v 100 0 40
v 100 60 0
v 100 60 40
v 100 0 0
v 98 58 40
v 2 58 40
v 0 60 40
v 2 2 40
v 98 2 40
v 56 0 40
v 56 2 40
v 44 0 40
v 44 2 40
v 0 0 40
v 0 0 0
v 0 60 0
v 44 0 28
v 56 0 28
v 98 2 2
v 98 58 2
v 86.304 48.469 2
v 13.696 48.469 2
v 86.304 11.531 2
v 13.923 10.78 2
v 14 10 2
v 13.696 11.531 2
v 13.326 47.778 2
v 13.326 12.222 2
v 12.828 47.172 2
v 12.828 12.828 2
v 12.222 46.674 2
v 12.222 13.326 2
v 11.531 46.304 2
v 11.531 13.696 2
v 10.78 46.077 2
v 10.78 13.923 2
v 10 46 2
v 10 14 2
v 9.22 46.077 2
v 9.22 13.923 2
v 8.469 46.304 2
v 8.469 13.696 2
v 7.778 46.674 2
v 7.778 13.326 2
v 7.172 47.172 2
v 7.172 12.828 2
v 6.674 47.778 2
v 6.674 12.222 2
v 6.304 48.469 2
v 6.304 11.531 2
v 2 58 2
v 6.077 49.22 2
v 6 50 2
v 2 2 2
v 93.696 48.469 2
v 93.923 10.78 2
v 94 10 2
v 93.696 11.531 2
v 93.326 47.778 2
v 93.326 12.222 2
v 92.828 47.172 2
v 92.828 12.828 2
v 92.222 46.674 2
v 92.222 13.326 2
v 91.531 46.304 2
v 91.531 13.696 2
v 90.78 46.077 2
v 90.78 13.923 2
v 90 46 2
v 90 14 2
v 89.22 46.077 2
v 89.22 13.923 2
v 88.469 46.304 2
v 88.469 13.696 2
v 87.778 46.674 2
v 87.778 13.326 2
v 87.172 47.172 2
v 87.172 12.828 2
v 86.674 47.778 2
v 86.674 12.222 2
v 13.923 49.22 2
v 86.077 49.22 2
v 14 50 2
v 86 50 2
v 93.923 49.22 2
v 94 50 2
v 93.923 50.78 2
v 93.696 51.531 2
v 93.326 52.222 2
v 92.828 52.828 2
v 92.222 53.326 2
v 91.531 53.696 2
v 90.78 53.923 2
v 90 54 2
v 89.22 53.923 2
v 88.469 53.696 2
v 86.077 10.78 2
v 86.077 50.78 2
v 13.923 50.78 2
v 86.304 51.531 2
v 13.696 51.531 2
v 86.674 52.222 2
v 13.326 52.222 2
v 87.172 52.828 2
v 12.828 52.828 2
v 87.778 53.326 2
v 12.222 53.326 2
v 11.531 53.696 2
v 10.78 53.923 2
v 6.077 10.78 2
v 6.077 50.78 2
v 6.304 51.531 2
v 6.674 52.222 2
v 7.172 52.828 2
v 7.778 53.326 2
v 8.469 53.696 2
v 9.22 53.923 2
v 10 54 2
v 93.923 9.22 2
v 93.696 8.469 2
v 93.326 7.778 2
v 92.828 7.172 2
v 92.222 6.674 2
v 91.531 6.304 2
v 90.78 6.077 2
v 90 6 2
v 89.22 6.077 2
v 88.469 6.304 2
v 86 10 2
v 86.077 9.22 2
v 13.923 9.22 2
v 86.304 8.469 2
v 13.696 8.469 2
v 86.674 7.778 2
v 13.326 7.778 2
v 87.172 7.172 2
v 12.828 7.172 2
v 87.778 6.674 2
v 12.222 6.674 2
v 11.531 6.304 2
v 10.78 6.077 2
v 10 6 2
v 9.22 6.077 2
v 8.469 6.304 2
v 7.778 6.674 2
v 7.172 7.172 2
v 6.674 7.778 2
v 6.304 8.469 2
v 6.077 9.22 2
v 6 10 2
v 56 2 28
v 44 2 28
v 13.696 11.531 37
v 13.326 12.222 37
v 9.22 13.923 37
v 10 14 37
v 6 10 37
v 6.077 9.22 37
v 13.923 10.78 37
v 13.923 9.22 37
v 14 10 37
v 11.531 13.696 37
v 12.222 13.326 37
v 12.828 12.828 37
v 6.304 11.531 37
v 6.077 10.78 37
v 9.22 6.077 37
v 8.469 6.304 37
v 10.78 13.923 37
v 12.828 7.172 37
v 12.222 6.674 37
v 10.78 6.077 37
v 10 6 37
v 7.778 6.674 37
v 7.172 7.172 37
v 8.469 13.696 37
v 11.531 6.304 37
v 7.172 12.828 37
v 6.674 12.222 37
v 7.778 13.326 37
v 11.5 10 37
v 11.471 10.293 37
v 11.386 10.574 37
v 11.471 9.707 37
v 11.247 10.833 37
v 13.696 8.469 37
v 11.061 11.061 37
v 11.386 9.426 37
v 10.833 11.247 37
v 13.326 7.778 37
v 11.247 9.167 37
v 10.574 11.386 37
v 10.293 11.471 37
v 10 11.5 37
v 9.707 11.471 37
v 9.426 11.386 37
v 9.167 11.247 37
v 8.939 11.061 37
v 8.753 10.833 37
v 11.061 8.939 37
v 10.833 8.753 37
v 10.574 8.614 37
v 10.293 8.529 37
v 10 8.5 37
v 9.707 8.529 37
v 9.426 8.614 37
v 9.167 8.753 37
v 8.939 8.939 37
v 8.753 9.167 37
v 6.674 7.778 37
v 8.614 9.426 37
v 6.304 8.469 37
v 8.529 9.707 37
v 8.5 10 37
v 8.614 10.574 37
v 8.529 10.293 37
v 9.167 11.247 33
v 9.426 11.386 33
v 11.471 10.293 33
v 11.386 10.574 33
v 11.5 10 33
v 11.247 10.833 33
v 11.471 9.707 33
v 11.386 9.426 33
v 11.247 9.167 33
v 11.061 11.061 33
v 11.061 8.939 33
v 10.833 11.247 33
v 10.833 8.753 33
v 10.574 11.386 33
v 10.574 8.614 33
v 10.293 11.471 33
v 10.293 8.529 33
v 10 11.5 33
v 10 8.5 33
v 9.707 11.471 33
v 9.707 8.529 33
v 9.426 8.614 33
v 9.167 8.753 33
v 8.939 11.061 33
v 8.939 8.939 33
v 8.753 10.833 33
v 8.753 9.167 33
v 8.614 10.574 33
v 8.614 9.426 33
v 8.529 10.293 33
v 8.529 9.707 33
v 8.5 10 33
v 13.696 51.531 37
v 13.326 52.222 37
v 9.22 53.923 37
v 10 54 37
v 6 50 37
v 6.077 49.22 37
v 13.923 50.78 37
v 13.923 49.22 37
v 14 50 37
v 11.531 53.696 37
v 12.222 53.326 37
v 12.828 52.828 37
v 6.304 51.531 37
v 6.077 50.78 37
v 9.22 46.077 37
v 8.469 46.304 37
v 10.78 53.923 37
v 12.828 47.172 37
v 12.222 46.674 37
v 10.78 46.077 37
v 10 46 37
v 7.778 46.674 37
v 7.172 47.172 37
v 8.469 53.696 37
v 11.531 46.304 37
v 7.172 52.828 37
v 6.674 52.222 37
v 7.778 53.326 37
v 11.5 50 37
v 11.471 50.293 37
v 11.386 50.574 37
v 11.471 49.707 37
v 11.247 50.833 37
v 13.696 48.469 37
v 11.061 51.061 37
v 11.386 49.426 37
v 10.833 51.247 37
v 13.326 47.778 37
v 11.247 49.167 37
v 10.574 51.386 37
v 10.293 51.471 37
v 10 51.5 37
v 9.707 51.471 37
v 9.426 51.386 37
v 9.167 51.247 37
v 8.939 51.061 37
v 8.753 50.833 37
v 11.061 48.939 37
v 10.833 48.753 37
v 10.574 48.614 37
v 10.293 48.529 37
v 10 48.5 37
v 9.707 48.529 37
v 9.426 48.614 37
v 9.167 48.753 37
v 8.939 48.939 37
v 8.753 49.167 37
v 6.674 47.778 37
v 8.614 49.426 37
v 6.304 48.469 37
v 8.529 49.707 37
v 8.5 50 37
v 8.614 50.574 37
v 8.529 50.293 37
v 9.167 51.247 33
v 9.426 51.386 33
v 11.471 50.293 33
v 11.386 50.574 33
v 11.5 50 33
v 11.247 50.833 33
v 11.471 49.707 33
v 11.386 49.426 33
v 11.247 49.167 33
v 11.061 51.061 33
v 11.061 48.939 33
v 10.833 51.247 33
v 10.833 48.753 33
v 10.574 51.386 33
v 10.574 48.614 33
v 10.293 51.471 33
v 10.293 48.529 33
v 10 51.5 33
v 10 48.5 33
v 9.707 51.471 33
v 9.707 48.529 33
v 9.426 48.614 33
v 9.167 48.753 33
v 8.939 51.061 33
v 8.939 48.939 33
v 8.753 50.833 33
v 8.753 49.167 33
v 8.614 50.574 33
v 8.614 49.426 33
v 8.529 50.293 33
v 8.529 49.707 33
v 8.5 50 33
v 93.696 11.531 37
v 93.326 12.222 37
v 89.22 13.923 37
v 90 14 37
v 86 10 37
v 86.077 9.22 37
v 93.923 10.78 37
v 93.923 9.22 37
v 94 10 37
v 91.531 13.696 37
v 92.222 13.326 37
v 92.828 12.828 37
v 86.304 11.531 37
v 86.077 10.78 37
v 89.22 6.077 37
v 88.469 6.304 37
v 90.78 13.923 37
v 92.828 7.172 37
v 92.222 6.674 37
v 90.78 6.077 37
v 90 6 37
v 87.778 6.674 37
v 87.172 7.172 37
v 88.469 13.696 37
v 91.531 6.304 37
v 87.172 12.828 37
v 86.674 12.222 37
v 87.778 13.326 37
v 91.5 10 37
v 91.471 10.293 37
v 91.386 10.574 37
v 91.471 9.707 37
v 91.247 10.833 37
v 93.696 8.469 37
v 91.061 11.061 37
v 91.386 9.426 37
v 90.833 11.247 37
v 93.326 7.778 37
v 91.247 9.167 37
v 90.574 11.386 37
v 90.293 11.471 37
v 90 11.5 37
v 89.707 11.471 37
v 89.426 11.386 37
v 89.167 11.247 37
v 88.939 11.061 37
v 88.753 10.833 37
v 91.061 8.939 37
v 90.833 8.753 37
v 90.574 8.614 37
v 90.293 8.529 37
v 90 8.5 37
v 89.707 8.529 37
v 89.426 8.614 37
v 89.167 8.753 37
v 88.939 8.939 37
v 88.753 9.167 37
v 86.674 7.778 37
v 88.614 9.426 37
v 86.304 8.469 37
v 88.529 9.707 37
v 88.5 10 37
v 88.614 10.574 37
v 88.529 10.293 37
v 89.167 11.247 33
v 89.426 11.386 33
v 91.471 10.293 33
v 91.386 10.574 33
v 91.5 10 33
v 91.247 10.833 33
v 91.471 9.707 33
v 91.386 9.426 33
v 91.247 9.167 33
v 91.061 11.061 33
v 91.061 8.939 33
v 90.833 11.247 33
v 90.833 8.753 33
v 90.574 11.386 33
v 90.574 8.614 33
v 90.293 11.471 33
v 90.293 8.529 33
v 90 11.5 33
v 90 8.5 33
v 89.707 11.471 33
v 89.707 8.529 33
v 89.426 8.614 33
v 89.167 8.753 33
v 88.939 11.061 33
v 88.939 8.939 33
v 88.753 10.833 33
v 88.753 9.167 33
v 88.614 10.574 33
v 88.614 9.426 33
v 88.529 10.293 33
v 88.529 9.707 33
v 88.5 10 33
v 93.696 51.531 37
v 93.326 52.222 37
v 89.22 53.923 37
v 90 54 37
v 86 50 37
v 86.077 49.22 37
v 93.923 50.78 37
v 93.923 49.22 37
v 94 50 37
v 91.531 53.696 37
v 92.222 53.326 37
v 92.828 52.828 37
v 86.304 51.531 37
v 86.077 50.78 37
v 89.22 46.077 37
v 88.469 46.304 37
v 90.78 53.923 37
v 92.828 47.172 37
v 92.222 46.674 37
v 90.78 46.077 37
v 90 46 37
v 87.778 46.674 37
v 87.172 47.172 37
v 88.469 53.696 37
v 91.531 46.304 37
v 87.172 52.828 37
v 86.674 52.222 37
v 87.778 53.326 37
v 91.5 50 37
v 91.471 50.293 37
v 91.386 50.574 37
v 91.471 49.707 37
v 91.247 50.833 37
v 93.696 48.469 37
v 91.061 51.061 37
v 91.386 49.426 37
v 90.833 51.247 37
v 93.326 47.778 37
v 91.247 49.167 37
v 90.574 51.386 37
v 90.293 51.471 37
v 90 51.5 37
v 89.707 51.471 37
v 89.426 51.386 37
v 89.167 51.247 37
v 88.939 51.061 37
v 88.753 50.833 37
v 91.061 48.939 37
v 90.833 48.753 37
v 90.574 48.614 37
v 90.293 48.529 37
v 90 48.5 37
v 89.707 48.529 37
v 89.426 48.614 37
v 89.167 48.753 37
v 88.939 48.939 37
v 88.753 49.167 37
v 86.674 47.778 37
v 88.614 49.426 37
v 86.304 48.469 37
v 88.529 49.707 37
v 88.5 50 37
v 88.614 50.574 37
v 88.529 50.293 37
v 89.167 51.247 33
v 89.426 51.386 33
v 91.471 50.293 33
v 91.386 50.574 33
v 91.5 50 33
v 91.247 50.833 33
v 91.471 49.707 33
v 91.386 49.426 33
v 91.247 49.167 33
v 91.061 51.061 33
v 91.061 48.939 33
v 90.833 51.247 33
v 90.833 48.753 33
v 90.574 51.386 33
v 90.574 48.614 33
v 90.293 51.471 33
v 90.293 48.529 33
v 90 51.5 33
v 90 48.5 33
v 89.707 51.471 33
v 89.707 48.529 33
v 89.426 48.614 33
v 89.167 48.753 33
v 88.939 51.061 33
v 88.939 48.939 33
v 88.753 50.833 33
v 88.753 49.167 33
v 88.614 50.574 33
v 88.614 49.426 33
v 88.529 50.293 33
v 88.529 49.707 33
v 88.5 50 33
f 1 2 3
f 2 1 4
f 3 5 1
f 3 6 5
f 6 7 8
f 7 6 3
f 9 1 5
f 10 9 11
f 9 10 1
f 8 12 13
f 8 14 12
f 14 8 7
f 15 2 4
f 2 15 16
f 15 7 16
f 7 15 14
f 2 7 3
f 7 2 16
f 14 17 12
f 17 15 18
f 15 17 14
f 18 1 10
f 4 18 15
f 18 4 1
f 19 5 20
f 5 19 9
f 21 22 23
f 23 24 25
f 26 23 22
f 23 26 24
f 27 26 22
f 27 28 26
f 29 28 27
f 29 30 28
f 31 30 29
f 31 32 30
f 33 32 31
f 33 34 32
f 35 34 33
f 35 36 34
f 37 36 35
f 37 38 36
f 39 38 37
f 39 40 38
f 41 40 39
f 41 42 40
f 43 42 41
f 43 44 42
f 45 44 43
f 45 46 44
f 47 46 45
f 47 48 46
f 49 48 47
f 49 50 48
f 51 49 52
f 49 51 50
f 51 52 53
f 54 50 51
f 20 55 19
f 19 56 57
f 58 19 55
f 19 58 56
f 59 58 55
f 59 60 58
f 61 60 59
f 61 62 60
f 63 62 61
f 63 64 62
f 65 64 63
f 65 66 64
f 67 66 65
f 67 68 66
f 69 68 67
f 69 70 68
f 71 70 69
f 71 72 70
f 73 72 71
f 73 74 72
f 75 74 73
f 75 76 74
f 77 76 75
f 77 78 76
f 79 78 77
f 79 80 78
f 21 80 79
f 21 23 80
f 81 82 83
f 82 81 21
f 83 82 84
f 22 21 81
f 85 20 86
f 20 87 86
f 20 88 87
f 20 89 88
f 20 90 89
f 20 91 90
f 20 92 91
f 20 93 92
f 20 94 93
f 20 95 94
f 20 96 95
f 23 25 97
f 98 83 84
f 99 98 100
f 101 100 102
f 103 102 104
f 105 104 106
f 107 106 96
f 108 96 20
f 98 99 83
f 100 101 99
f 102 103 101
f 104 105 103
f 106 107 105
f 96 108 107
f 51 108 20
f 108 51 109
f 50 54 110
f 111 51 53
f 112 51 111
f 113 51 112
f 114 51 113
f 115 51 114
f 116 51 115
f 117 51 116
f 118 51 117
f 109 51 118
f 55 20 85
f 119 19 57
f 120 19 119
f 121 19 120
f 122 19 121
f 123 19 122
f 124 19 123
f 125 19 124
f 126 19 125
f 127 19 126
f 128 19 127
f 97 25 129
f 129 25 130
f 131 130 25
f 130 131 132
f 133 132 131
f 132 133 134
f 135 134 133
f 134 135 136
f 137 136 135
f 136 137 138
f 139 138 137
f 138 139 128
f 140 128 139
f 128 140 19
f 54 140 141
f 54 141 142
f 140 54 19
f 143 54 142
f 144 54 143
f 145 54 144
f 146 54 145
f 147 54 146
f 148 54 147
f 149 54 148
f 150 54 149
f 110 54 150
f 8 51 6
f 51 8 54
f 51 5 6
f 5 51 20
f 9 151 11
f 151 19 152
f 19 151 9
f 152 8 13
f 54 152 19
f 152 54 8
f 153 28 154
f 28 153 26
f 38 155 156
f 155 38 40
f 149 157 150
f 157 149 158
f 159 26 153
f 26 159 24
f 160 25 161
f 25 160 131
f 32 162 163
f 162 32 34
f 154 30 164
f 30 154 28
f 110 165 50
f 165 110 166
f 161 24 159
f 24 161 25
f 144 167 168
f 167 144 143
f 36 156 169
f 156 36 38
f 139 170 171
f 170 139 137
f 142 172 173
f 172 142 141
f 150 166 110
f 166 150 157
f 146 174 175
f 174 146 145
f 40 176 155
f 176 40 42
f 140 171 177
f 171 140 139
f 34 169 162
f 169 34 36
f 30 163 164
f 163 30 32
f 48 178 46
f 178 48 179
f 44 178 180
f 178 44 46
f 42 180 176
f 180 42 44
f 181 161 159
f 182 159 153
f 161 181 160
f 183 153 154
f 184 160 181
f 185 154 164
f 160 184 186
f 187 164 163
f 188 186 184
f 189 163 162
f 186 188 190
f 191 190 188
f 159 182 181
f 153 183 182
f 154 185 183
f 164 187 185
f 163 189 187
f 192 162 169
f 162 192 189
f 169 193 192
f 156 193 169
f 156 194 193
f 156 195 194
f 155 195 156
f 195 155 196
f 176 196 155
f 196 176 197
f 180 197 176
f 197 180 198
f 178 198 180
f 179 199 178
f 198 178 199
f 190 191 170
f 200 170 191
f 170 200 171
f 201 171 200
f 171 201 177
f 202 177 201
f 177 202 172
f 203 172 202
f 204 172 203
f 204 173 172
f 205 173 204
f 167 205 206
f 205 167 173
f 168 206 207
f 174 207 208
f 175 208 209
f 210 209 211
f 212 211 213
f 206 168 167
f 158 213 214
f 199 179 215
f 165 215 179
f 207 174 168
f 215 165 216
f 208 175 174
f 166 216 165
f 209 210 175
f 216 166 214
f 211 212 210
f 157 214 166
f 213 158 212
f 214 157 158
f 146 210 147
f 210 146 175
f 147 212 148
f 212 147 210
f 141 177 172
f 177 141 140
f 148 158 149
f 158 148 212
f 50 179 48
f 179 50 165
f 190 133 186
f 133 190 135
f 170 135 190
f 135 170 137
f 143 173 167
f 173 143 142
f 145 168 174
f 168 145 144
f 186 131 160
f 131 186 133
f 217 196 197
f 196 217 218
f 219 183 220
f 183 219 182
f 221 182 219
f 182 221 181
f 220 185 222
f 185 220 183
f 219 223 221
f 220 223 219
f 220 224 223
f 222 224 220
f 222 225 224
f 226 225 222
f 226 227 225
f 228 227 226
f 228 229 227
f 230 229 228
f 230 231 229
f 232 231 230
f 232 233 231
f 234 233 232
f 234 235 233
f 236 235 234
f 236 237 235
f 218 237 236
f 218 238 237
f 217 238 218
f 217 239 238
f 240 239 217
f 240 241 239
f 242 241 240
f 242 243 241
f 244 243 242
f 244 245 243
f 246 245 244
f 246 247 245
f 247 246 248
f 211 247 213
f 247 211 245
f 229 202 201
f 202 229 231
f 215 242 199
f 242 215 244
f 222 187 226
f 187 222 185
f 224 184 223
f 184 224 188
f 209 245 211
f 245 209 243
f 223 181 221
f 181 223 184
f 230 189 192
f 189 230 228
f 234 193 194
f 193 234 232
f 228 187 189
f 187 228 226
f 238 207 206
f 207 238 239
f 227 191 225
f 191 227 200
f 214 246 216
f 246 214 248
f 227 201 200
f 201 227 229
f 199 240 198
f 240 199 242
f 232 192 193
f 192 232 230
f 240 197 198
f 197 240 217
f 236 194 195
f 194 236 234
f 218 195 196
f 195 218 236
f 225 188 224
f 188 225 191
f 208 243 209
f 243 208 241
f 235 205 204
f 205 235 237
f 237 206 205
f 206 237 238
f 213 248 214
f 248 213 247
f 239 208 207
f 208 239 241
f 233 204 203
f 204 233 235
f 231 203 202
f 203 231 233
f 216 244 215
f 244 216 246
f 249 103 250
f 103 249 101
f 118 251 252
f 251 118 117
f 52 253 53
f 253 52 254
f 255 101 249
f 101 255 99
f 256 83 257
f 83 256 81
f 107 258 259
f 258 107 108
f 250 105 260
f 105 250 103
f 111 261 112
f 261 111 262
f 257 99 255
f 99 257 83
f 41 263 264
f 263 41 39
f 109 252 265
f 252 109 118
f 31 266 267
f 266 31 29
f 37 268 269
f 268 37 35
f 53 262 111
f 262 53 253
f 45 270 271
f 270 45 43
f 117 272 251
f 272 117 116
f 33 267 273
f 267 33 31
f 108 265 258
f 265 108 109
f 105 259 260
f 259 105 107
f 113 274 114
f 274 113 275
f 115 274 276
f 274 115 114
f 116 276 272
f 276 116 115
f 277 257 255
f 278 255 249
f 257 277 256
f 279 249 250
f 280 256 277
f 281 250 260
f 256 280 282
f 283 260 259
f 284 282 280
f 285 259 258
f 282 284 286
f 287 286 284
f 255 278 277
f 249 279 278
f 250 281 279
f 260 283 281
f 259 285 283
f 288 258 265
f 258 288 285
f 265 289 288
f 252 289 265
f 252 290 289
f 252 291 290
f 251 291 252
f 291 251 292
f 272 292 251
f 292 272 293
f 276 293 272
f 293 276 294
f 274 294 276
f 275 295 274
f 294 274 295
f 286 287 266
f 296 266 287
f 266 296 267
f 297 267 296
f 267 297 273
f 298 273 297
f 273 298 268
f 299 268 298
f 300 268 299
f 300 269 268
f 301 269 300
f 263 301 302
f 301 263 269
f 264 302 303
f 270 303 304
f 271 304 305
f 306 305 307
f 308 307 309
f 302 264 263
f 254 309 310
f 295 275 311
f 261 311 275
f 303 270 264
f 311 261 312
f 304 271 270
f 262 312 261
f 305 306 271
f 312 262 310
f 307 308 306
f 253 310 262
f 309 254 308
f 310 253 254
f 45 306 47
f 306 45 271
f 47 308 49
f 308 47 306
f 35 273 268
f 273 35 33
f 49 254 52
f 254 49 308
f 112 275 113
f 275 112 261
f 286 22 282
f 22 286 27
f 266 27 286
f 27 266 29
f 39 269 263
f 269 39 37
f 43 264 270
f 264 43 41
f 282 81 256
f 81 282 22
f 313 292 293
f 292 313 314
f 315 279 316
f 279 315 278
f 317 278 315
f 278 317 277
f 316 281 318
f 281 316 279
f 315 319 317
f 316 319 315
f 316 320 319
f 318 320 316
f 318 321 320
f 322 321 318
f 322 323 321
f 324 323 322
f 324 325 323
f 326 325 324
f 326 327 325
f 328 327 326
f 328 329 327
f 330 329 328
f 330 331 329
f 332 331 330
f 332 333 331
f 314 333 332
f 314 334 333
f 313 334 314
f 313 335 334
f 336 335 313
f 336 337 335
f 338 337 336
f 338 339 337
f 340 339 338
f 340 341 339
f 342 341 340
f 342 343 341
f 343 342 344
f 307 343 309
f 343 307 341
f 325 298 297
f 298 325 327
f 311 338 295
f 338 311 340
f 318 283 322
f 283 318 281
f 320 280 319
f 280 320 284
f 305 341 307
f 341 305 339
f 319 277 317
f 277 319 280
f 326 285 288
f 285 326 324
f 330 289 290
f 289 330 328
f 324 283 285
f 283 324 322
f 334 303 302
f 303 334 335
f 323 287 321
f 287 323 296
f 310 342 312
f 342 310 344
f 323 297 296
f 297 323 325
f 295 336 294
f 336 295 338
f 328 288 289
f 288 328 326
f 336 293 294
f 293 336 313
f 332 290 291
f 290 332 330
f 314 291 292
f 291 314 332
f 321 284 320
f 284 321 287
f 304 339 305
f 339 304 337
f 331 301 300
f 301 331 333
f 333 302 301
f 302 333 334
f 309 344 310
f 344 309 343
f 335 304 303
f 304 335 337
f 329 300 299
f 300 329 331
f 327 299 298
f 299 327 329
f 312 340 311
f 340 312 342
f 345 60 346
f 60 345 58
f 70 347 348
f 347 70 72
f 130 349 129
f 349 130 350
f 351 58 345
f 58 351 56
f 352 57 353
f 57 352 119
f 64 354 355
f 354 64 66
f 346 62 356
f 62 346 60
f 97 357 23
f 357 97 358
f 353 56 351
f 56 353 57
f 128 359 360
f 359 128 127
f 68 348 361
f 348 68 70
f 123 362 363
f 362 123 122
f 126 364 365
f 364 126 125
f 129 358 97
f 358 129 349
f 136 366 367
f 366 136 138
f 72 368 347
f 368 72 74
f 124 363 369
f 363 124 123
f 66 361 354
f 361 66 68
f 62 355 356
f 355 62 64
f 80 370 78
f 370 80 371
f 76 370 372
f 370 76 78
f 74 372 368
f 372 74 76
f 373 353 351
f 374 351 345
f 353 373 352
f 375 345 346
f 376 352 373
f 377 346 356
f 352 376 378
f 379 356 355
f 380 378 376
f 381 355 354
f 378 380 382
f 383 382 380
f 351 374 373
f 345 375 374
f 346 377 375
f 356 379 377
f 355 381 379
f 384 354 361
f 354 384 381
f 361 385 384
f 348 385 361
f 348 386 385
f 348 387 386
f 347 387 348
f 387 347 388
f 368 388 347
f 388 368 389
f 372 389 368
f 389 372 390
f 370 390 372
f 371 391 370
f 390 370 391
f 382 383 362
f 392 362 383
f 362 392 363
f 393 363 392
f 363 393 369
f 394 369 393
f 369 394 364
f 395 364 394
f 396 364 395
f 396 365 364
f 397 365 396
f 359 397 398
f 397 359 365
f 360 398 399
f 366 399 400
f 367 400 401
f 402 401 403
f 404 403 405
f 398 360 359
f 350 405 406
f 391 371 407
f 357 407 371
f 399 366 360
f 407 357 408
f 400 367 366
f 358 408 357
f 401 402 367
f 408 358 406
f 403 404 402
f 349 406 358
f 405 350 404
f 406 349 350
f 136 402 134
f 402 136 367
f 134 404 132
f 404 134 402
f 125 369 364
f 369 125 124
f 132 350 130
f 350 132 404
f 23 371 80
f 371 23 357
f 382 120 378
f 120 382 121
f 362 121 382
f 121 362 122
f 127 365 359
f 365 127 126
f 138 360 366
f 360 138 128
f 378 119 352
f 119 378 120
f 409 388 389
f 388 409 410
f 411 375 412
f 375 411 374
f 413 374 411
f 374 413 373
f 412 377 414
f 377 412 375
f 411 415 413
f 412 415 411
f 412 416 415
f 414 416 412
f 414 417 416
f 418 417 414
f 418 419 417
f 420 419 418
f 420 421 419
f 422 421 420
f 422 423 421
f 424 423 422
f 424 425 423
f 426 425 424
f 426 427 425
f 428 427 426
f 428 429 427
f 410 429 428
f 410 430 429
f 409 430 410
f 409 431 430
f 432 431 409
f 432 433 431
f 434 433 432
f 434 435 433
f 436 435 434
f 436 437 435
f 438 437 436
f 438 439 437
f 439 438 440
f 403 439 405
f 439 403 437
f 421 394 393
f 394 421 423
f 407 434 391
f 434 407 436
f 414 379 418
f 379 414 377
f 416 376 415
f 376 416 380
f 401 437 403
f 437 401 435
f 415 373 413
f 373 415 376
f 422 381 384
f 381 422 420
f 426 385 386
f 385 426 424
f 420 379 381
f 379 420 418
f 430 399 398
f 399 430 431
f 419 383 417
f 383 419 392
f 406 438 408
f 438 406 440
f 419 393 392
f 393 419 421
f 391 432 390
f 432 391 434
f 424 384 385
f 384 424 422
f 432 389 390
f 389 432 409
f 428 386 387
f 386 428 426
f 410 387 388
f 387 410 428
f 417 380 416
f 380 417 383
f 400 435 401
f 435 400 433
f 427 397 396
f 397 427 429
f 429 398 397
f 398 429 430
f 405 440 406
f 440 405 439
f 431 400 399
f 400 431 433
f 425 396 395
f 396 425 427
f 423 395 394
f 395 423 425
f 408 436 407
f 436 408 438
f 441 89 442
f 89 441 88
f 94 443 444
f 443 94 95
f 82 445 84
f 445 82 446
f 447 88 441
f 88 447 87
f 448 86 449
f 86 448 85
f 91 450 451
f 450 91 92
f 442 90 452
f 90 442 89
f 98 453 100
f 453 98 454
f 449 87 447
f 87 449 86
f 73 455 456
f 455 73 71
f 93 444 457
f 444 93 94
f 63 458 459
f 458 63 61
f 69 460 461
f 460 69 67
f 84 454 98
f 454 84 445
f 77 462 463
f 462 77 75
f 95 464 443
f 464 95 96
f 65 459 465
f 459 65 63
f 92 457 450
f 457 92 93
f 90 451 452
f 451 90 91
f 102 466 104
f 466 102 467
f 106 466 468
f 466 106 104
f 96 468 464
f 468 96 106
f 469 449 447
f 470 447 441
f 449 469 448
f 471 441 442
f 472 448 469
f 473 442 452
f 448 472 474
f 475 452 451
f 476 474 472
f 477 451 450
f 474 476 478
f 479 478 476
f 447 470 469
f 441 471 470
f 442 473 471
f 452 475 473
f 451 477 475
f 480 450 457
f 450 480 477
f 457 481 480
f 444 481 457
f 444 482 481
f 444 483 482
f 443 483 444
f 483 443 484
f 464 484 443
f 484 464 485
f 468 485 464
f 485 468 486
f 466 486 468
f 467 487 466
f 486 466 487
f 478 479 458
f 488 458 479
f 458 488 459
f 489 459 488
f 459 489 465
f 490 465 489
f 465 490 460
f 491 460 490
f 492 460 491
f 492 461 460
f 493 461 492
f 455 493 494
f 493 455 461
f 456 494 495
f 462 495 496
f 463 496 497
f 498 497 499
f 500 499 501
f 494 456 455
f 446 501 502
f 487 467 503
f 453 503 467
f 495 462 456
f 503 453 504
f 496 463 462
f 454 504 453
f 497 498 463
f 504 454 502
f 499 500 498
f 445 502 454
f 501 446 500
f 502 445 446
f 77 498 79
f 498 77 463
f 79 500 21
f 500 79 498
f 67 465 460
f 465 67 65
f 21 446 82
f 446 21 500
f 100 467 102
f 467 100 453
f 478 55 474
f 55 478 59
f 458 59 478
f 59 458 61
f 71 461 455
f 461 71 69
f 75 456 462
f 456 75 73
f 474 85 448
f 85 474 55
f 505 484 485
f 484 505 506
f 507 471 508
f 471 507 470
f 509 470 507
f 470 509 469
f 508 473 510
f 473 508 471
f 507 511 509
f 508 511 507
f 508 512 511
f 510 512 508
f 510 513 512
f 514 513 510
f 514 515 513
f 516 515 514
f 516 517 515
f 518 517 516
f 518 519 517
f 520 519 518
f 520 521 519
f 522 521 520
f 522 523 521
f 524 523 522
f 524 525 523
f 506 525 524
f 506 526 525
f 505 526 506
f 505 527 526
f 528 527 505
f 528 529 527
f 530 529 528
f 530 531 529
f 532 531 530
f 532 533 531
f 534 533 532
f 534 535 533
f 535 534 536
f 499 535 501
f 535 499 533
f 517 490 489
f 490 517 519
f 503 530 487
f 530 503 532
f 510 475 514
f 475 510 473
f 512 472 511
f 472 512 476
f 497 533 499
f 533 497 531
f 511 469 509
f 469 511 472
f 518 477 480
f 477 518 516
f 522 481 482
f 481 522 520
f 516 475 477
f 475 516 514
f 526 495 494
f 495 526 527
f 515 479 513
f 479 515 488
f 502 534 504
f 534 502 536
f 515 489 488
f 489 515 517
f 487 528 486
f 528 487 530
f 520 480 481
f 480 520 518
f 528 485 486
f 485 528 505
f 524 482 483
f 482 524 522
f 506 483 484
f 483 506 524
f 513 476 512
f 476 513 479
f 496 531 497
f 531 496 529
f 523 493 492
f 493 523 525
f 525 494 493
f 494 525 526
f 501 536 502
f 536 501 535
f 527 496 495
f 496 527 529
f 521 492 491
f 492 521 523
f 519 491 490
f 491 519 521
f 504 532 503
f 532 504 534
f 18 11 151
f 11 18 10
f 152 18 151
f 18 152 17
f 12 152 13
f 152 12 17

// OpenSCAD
$fn = 32;

// ----------------------------------------------------------------------
// Enclosure box: both enclosure
// ----------------------------------------------------------------------

// --- parameters (mm) ---
box_l = 100;              // outer length, X
box_w = 60;               // outer width, Y
box_h = 40;               // outer height
wall_t = 2;               // wall thickness
boss_r = 4;               // corner boss radius
hole_r = 1.5;             // boss screw hole radius
boss_in = 10;             // boss inset from the corners
notch_w = 12;             // cable notch width
notch_h = 12;             // cable notch height

inner_h = box_h - wall_t;  // cavity depth
boss_h = inner_h - 2;  // corner boss height

difference() {
  union() {
    difference() {
      cube([box_l, box_w, box_h]);
      translate([wall_t, wall_t, wall_t])
        cube([box_l - 2 * wall_t, box_w - 2 * wall_t, box_h]);
    }
    for (sx = [0, 1], sy = [0, 1])
      translate([sx ? box_l - boss_in : boss_in,
                 sy ? box_w - boss_in : boss_in, wall_t - 1])
        difference() {
          cylinder(r = boss_r, h = boss_h);
          translate([0, 0, boss_h - 4])
            cylinder(r = hole_r, h = 5);
        }
  }
  translate([box_l / 2 - notch_w / 2, -1, box_h - notch_h])
    cube([notch_w, wall_t + 2, notch_h + 1]);
}
